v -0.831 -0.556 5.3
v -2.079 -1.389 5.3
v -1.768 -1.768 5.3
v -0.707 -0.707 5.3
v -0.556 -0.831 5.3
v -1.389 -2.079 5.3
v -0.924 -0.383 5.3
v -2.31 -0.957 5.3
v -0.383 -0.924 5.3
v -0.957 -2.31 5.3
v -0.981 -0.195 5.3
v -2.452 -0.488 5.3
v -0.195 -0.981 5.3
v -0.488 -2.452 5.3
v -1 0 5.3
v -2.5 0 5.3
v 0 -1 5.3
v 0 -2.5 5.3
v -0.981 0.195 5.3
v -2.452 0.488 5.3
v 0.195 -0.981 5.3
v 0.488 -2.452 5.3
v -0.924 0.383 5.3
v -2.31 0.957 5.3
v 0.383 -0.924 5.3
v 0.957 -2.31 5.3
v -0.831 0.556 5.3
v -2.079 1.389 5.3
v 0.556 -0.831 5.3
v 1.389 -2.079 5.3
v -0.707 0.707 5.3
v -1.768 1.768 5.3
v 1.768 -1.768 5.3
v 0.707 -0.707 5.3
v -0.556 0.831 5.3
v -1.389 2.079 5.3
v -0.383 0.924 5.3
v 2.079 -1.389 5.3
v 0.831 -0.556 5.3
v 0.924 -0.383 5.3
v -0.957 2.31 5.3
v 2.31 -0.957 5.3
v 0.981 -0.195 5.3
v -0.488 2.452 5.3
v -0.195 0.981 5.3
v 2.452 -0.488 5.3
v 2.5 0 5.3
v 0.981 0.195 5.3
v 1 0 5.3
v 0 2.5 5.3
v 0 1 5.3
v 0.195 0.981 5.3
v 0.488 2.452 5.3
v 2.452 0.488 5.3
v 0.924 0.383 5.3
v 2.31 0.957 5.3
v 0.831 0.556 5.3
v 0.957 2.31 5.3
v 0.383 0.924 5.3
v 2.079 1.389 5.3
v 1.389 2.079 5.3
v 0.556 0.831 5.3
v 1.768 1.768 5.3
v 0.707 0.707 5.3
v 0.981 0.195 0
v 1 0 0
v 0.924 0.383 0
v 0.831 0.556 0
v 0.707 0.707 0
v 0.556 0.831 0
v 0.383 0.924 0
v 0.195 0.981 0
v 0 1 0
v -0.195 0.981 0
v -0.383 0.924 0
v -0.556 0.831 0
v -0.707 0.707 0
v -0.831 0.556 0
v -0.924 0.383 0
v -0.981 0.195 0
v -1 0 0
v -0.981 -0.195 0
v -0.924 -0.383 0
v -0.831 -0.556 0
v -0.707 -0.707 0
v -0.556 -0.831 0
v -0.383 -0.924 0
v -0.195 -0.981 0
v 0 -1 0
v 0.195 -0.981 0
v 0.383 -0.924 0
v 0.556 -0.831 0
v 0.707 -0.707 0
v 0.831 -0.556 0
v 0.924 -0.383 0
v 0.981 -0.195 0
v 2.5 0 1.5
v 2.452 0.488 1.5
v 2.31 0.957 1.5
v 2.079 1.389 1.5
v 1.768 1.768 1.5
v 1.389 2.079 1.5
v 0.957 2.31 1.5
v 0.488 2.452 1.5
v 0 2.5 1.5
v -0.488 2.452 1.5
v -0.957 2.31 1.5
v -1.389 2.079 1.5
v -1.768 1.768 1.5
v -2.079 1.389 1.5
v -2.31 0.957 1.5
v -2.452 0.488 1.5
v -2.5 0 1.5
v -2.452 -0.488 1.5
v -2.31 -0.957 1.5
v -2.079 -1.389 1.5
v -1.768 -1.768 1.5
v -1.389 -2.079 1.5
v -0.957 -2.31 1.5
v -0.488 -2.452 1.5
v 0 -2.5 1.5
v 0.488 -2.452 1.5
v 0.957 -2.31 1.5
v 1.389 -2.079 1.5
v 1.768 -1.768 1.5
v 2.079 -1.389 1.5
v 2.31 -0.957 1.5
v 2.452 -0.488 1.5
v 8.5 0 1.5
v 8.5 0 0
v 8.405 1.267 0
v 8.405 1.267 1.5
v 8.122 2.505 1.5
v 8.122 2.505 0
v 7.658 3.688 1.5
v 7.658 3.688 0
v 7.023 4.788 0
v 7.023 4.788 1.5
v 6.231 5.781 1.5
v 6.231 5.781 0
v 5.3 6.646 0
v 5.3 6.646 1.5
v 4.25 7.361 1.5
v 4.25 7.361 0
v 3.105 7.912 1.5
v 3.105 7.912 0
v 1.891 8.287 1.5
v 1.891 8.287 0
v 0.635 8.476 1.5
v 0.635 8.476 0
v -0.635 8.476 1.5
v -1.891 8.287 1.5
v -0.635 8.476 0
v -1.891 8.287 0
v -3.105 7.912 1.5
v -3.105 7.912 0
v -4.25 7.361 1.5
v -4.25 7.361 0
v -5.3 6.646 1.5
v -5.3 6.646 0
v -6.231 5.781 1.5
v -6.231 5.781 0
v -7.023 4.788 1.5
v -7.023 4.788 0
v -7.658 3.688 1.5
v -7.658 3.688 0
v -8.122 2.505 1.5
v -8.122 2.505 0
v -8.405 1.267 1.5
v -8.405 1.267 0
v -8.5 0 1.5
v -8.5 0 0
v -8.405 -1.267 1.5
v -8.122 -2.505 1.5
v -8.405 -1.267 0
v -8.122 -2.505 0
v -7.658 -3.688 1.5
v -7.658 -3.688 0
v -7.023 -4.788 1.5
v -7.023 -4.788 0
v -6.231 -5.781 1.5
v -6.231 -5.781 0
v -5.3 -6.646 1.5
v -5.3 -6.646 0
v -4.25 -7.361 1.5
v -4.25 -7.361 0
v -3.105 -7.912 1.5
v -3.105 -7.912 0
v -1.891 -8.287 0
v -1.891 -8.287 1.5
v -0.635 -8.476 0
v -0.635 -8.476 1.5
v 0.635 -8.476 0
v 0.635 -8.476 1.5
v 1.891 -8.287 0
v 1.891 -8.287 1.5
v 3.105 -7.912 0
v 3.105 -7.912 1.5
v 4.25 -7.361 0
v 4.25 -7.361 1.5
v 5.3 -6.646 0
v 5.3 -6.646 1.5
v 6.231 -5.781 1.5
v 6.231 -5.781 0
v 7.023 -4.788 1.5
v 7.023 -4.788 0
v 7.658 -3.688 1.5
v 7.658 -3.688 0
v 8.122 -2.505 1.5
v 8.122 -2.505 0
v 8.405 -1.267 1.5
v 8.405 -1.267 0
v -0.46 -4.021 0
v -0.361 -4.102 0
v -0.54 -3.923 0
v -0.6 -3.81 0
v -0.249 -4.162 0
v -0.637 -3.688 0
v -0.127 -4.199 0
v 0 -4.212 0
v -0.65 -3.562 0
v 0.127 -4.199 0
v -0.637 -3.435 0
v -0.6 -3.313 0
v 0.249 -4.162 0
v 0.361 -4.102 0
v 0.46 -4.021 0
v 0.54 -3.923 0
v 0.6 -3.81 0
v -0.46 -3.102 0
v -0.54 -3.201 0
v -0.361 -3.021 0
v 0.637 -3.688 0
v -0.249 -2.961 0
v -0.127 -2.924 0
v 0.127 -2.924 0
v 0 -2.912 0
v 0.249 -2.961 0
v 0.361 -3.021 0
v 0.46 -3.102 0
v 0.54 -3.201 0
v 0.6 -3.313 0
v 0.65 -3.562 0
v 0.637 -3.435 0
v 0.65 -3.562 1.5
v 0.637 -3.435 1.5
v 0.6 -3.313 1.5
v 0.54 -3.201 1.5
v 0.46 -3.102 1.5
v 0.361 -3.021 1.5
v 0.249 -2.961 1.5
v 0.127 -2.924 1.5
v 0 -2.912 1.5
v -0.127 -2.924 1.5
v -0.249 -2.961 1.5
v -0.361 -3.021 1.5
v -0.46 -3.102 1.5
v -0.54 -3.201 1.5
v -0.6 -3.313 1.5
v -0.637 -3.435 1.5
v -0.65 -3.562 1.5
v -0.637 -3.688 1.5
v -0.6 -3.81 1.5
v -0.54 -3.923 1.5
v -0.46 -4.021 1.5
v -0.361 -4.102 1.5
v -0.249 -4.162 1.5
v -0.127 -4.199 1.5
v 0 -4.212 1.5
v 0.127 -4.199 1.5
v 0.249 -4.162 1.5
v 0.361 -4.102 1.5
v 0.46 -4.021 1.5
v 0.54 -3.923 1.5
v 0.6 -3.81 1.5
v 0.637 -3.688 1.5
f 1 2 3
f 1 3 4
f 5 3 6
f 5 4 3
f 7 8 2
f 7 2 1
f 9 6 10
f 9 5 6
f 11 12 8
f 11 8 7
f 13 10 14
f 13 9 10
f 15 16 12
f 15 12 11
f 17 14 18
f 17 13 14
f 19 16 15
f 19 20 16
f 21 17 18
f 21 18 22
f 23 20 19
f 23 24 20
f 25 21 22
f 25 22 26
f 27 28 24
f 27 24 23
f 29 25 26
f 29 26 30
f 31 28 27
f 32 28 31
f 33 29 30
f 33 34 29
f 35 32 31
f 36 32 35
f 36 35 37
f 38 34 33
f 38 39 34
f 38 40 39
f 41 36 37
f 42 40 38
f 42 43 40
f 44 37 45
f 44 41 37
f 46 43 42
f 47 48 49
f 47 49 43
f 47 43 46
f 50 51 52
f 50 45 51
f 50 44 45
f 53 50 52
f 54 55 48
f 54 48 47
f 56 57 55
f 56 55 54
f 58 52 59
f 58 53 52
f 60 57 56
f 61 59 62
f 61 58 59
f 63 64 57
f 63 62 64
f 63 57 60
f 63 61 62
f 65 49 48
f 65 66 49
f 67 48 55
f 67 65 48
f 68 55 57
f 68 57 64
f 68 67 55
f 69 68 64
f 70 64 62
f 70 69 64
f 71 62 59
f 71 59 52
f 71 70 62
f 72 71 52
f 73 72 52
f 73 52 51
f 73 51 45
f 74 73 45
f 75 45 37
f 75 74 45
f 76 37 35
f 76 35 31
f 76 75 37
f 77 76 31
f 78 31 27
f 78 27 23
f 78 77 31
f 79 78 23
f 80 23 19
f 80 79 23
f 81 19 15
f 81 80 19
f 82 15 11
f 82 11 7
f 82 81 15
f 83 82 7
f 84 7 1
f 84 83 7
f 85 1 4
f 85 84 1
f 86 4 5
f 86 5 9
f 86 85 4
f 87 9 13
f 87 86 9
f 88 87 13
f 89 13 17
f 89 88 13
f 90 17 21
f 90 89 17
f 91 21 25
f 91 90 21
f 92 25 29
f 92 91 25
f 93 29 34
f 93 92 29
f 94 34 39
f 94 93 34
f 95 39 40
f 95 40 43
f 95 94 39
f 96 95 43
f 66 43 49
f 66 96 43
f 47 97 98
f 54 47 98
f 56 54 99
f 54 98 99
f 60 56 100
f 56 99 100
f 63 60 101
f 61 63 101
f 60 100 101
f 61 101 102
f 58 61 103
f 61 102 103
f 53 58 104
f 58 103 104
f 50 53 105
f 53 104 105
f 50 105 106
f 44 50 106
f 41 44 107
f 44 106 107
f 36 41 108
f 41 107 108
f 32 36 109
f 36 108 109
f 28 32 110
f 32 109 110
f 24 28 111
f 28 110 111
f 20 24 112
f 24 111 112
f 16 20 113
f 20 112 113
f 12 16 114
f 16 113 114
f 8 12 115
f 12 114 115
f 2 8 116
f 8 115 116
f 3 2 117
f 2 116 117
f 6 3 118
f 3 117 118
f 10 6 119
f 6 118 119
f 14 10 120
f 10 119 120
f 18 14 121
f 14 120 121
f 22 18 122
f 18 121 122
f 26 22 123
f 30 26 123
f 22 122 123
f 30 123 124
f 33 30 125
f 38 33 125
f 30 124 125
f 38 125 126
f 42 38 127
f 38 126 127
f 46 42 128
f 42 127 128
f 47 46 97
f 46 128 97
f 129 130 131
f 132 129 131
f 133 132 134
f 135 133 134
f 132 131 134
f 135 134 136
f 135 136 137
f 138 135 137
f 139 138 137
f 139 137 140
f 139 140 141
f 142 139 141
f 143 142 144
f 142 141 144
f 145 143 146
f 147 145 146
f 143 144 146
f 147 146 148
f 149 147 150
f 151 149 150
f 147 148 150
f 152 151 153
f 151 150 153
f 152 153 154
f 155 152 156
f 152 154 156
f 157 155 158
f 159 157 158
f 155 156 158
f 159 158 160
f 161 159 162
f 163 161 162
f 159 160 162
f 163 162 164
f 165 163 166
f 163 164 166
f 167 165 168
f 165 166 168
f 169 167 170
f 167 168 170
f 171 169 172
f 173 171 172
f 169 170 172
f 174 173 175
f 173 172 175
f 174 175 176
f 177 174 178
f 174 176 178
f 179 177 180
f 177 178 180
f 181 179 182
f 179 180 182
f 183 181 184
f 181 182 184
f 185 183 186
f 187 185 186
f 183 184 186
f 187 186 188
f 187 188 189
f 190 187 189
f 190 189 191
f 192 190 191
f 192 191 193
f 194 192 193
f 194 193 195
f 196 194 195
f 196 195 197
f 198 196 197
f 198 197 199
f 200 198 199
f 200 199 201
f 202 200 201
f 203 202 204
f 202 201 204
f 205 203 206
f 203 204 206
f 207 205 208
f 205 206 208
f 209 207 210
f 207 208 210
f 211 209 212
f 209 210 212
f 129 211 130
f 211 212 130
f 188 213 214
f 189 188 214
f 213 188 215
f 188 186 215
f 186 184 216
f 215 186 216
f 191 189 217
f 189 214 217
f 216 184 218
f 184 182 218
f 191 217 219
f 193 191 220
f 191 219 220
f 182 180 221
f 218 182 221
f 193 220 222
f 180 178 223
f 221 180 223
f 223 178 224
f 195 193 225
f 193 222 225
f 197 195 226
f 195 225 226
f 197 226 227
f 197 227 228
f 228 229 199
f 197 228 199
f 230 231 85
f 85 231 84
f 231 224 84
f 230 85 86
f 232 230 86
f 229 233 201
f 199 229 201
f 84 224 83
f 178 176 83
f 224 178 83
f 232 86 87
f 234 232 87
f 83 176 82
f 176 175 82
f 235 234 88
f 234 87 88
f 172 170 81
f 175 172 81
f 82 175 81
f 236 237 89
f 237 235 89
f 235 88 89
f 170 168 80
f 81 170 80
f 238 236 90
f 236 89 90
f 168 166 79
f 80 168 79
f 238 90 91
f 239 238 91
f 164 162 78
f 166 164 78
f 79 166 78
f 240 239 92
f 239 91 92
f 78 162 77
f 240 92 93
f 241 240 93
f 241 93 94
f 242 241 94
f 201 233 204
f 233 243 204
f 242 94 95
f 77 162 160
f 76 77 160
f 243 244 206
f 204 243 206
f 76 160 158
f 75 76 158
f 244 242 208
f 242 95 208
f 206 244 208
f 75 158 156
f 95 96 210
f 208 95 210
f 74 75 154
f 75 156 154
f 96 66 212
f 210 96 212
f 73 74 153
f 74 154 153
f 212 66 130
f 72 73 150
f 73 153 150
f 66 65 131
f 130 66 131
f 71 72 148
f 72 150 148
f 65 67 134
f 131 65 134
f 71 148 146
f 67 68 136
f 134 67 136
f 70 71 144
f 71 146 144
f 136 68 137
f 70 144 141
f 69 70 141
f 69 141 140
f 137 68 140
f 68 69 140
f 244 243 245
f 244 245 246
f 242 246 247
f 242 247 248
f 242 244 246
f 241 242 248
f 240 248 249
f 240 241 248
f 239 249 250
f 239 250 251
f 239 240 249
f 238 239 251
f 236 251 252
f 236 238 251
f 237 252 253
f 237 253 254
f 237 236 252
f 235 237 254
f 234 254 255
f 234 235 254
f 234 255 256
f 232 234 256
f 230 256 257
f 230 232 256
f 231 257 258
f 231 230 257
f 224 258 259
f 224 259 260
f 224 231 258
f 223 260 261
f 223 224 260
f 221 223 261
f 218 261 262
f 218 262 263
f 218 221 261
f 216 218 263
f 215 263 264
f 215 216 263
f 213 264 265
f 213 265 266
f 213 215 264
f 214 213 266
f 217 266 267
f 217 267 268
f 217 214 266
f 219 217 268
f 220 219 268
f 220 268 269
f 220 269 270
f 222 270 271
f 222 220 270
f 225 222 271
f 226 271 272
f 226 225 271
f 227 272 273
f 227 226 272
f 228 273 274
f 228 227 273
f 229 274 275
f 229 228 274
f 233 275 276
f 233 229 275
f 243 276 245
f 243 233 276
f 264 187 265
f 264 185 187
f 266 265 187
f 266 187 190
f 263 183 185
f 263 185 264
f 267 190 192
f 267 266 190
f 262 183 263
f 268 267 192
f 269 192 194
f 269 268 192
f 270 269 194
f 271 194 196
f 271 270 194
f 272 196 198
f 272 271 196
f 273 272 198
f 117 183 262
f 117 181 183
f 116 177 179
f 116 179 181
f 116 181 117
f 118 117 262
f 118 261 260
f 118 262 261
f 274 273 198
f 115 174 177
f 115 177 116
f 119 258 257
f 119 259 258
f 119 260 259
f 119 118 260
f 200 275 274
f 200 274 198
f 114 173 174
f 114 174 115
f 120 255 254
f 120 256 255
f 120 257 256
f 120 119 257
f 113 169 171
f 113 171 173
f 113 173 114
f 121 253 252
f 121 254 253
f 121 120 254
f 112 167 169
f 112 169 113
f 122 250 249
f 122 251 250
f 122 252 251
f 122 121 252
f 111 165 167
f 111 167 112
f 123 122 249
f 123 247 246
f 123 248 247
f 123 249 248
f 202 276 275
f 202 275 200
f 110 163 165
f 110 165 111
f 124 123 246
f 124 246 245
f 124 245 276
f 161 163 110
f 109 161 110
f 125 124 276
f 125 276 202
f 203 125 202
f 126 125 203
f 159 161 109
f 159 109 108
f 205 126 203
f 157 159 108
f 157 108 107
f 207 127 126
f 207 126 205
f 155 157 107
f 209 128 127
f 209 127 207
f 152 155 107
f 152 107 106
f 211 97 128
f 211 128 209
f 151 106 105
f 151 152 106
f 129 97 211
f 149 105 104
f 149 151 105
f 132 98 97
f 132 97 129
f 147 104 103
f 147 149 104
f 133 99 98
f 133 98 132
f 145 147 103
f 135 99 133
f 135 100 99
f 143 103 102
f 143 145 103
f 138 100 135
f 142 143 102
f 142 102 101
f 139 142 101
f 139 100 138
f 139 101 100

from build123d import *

# Parameters (mm, degrees)
F0_R     = 8.5
F0_R_2   = 1
F1_DEPTH = 1.5
F2_R     = 2.5
F2_R_2   = 1
F3_DEPTH = 3.8
F4_R     = 0.6498381819
F5_DEPTH = 1.5


# Not quite as in the source:
# - a feature names something its author has since deleted; it is built from what else it names


with BuildPart() as f1:
    # F0 (on Top) → F1 (new body)
    with BuildSketch(Plane.XY):
        Circle(F0_R)
        Circle(F0_R_2, mode=Mode.SUBTRACT)
    extrude(amount=F1_DEPTH)

    # F2 (on face) → F3 (join)
    with BuildSketch(Plane.XY.offset(1.5)):
        Circle(F2_R)
        Circle(F2_R_2, mode=Mode.SUBTRACT)
    extrude(amount=F3_DEPTH)

    # F4 (on Top) → F5 (cut, through all)
    with BuildSketch(Plane.XY):
        with Locations((0, -3.5616646055)):
            Circle(F4_R)
    extrude(amount=F5_DEPTH, mode=Mode.SUBTRACT)


solid = f1.part
